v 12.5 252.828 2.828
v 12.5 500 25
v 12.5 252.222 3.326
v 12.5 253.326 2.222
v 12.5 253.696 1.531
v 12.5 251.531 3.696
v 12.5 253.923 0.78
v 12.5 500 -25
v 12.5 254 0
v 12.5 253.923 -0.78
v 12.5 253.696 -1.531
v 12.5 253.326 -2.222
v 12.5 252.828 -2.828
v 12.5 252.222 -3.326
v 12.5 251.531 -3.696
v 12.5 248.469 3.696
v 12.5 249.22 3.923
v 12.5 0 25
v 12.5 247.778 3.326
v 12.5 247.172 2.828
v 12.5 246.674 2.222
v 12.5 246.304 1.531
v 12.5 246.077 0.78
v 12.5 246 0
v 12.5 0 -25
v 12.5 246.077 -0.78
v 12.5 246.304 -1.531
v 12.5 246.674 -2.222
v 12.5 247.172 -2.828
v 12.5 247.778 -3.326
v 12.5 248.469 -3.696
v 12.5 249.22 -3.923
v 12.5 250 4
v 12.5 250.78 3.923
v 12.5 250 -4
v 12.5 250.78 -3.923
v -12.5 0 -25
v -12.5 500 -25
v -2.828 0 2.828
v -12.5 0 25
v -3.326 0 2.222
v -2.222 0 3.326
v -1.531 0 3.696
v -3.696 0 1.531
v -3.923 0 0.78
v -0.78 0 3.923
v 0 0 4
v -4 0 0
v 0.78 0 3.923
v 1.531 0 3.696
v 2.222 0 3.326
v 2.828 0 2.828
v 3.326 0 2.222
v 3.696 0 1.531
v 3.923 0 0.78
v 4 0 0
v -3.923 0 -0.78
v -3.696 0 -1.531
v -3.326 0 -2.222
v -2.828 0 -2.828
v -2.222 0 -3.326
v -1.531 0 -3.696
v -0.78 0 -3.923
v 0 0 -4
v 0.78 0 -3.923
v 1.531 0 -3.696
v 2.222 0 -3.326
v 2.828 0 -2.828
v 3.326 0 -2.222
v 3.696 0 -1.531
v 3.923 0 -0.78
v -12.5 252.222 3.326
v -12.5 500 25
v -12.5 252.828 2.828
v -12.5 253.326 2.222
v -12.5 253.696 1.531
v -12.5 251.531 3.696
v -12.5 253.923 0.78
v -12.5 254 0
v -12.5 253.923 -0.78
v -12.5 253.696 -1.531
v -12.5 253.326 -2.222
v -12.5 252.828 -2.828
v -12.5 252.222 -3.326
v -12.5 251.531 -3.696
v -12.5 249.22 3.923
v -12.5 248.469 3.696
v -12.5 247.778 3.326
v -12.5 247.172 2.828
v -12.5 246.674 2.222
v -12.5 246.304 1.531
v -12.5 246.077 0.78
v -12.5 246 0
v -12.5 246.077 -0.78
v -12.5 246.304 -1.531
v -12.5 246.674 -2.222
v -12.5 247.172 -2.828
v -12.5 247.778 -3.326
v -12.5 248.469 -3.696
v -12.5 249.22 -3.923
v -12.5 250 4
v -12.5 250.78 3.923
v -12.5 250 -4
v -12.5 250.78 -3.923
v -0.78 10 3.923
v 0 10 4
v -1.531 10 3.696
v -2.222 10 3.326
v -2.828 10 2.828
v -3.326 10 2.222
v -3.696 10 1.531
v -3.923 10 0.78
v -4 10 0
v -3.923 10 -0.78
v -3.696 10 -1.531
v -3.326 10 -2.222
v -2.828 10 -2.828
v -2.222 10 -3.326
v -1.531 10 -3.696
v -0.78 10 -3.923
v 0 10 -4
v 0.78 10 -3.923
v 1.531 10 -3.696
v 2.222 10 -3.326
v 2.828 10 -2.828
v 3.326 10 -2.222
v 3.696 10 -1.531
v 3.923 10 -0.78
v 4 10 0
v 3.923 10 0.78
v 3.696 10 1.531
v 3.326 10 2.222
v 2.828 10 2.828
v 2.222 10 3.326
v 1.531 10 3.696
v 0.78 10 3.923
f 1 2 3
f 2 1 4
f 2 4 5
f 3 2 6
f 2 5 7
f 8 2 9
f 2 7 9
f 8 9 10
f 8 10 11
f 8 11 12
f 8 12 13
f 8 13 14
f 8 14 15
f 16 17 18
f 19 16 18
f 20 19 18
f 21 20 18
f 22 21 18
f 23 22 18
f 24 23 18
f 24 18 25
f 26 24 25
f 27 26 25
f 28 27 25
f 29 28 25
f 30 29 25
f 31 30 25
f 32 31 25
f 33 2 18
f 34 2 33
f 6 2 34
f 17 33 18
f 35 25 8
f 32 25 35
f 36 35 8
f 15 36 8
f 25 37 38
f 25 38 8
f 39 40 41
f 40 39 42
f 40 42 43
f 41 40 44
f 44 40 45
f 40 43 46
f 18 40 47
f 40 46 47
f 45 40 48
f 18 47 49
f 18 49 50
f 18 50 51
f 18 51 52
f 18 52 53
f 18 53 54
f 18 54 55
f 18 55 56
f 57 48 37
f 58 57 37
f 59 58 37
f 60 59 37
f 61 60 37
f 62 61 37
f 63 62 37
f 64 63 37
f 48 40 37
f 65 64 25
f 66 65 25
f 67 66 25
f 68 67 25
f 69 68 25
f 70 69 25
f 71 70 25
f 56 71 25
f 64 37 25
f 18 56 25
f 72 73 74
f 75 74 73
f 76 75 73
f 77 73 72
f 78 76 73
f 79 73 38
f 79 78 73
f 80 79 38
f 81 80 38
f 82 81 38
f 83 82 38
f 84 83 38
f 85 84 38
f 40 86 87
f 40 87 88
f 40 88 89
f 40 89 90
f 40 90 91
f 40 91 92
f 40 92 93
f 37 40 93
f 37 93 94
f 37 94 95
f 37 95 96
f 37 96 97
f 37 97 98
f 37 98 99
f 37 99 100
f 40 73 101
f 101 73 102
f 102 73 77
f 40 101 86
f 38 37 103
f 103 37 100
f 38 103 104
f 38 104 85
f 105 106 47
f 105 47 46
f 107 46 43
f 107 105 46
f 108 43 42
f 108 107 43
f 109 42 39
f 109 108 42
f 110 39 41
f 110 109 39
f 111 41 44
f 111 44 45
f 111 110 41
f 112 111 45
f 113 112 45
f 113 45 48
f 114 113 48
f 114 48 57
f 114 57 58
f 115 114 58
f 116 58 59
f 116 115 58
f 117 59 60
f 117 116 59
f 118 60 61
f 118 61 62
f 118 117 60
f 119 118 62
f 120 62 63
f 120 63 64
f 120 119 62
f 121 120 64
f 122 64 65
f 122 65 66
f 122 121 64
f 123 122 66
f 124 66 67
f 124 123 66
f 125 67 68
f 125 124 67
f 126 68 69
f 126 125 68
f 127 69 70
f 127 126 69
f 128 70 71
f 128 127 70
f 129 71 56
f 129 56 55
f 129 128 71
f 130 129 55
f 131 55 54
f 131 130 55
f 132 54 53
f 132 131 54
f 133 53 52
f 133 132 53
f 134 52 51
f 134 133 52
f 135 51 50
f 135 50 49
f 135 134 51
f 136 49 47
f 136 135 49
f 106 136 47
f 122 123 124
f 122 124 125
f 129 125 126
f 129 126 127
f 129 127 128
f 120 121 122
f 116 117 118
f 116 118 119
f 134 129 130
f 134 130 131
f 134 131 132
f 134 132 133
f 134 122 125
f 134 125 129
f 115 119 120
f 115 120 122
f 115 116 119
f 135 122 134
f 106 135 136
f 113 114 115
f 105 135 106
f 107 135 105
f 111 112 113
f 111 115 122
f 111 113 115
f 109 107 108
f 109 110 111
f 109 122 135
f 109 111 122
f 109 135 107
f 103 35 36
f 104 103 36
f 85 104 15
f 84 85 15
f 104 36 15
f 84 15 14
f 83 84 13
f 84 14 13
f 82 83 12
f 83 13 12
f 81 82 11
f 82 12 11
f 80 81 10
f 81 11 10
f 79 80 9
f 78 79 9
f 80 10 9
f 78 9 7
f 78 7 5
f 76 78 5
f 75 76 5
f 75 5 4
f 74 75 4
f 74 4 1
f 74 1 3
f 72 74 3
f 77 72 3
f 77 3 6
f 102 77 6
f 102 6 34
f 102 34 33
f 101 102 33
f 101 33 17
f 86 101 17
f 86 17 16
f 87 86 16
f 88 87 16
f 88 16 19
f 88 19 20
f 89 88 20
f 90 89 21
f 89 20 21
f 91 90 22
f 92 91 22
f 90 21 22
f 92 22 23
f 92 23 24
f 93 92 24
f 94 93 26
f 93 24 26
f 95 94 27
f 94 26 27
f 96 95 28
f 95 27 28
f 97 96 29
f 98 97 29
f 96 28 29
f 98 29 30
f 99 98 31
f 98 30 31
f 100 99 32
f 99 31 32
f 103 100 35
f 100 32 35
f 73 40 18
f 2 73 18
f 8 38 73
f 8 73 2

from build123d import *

# Parameters (mm, degrees)
SKETCH_1_W          = 25
SKETCH_1_H          = 50
EXTRUDE_1_DEPTH     = 550
SKETCH_2_R          = 4
CUT_EXTRUDE_1_DEPTH = 10
CUT_EXTRUDE_START   = -10
SKETCH_3_R          = 4
CUT_EXTRUDE_2_DEPTH = 10
SKETCH_4_W          = 25
SKETCH_4_H          = 50
CUT_EXTRUDE_3_DEPTH = 50
SKETCH_5_R          = 4
CUT_EXTRUDE_4_DEPTH = 51


with BuildPart() as part:
    # Эскиз1 → Бобышка-Вытянуть1 (new body)
    with BuildSketch(Plane(origin=(0, 0, 0), x_dir=(1, 0, 0), z_dir=(0, 1, 0))):
        Rectangle(SKETCH_1_W, SKETCH_1_H)
    extrude(amount=EXTRUDE_1_DEPTH)

    # Эскиз2 → Вырез-Вытянуть1 (cut)
    with BuildSketch(Plane(origin=(0, 550, 0), x_dir=(1, 0, 0), z_dir=(0, 1, 0))):
        with Locations(Location((0, 0, 0), (0, 0, 270))):
            Circle(SKETCH_2_R)
    extrude(amount=-CUT_EXTRUDE_1_DEPTH, mode=Mode.SUBTRACT)

    # Эскиз3 → Вырез-Вытянуть2 (cut)
    with BuildSketch(Plane.XZ.offset(CUT_EXTRUDE_START)):
        with Locations(Location((0, 0, 0), (0, 0, 90))):
            Circle(SKETCH_3_R)
    extrude(amount=CUT_EXTRUDE_2_DEPTH, mode=Mode.SUBTRACT)

    # Эскиз4 → Вырез-Вытянуть3 (cut)
    with BuildSketch(Plane(origin=(0, 550, 0), x_dir=(1, 0, 0), z_dir=(0, 1, 0))):
        Rectangle(SKETCH_4_W, SKETCH_4_H)
    extrude(amount=-CUT_EXTRUDE_3_DEPTH, mode=Mode.SUBTRACT)

    # Эскиз5 → Вырез-Вытянуть4 (cut)
    with BuildSketch(Plane(origin=(12.5, 0, 0), x_dir=(0, 0, -1), z_dir=(1, 0, 0))):
        with Locations((0, 250)):
            Circle(SKETCH_5_R)
    extrude(amount=-CUT_EXTRUDE_4_DEPTH, mode=Mode.SUBTRACT)


solid = part.part
